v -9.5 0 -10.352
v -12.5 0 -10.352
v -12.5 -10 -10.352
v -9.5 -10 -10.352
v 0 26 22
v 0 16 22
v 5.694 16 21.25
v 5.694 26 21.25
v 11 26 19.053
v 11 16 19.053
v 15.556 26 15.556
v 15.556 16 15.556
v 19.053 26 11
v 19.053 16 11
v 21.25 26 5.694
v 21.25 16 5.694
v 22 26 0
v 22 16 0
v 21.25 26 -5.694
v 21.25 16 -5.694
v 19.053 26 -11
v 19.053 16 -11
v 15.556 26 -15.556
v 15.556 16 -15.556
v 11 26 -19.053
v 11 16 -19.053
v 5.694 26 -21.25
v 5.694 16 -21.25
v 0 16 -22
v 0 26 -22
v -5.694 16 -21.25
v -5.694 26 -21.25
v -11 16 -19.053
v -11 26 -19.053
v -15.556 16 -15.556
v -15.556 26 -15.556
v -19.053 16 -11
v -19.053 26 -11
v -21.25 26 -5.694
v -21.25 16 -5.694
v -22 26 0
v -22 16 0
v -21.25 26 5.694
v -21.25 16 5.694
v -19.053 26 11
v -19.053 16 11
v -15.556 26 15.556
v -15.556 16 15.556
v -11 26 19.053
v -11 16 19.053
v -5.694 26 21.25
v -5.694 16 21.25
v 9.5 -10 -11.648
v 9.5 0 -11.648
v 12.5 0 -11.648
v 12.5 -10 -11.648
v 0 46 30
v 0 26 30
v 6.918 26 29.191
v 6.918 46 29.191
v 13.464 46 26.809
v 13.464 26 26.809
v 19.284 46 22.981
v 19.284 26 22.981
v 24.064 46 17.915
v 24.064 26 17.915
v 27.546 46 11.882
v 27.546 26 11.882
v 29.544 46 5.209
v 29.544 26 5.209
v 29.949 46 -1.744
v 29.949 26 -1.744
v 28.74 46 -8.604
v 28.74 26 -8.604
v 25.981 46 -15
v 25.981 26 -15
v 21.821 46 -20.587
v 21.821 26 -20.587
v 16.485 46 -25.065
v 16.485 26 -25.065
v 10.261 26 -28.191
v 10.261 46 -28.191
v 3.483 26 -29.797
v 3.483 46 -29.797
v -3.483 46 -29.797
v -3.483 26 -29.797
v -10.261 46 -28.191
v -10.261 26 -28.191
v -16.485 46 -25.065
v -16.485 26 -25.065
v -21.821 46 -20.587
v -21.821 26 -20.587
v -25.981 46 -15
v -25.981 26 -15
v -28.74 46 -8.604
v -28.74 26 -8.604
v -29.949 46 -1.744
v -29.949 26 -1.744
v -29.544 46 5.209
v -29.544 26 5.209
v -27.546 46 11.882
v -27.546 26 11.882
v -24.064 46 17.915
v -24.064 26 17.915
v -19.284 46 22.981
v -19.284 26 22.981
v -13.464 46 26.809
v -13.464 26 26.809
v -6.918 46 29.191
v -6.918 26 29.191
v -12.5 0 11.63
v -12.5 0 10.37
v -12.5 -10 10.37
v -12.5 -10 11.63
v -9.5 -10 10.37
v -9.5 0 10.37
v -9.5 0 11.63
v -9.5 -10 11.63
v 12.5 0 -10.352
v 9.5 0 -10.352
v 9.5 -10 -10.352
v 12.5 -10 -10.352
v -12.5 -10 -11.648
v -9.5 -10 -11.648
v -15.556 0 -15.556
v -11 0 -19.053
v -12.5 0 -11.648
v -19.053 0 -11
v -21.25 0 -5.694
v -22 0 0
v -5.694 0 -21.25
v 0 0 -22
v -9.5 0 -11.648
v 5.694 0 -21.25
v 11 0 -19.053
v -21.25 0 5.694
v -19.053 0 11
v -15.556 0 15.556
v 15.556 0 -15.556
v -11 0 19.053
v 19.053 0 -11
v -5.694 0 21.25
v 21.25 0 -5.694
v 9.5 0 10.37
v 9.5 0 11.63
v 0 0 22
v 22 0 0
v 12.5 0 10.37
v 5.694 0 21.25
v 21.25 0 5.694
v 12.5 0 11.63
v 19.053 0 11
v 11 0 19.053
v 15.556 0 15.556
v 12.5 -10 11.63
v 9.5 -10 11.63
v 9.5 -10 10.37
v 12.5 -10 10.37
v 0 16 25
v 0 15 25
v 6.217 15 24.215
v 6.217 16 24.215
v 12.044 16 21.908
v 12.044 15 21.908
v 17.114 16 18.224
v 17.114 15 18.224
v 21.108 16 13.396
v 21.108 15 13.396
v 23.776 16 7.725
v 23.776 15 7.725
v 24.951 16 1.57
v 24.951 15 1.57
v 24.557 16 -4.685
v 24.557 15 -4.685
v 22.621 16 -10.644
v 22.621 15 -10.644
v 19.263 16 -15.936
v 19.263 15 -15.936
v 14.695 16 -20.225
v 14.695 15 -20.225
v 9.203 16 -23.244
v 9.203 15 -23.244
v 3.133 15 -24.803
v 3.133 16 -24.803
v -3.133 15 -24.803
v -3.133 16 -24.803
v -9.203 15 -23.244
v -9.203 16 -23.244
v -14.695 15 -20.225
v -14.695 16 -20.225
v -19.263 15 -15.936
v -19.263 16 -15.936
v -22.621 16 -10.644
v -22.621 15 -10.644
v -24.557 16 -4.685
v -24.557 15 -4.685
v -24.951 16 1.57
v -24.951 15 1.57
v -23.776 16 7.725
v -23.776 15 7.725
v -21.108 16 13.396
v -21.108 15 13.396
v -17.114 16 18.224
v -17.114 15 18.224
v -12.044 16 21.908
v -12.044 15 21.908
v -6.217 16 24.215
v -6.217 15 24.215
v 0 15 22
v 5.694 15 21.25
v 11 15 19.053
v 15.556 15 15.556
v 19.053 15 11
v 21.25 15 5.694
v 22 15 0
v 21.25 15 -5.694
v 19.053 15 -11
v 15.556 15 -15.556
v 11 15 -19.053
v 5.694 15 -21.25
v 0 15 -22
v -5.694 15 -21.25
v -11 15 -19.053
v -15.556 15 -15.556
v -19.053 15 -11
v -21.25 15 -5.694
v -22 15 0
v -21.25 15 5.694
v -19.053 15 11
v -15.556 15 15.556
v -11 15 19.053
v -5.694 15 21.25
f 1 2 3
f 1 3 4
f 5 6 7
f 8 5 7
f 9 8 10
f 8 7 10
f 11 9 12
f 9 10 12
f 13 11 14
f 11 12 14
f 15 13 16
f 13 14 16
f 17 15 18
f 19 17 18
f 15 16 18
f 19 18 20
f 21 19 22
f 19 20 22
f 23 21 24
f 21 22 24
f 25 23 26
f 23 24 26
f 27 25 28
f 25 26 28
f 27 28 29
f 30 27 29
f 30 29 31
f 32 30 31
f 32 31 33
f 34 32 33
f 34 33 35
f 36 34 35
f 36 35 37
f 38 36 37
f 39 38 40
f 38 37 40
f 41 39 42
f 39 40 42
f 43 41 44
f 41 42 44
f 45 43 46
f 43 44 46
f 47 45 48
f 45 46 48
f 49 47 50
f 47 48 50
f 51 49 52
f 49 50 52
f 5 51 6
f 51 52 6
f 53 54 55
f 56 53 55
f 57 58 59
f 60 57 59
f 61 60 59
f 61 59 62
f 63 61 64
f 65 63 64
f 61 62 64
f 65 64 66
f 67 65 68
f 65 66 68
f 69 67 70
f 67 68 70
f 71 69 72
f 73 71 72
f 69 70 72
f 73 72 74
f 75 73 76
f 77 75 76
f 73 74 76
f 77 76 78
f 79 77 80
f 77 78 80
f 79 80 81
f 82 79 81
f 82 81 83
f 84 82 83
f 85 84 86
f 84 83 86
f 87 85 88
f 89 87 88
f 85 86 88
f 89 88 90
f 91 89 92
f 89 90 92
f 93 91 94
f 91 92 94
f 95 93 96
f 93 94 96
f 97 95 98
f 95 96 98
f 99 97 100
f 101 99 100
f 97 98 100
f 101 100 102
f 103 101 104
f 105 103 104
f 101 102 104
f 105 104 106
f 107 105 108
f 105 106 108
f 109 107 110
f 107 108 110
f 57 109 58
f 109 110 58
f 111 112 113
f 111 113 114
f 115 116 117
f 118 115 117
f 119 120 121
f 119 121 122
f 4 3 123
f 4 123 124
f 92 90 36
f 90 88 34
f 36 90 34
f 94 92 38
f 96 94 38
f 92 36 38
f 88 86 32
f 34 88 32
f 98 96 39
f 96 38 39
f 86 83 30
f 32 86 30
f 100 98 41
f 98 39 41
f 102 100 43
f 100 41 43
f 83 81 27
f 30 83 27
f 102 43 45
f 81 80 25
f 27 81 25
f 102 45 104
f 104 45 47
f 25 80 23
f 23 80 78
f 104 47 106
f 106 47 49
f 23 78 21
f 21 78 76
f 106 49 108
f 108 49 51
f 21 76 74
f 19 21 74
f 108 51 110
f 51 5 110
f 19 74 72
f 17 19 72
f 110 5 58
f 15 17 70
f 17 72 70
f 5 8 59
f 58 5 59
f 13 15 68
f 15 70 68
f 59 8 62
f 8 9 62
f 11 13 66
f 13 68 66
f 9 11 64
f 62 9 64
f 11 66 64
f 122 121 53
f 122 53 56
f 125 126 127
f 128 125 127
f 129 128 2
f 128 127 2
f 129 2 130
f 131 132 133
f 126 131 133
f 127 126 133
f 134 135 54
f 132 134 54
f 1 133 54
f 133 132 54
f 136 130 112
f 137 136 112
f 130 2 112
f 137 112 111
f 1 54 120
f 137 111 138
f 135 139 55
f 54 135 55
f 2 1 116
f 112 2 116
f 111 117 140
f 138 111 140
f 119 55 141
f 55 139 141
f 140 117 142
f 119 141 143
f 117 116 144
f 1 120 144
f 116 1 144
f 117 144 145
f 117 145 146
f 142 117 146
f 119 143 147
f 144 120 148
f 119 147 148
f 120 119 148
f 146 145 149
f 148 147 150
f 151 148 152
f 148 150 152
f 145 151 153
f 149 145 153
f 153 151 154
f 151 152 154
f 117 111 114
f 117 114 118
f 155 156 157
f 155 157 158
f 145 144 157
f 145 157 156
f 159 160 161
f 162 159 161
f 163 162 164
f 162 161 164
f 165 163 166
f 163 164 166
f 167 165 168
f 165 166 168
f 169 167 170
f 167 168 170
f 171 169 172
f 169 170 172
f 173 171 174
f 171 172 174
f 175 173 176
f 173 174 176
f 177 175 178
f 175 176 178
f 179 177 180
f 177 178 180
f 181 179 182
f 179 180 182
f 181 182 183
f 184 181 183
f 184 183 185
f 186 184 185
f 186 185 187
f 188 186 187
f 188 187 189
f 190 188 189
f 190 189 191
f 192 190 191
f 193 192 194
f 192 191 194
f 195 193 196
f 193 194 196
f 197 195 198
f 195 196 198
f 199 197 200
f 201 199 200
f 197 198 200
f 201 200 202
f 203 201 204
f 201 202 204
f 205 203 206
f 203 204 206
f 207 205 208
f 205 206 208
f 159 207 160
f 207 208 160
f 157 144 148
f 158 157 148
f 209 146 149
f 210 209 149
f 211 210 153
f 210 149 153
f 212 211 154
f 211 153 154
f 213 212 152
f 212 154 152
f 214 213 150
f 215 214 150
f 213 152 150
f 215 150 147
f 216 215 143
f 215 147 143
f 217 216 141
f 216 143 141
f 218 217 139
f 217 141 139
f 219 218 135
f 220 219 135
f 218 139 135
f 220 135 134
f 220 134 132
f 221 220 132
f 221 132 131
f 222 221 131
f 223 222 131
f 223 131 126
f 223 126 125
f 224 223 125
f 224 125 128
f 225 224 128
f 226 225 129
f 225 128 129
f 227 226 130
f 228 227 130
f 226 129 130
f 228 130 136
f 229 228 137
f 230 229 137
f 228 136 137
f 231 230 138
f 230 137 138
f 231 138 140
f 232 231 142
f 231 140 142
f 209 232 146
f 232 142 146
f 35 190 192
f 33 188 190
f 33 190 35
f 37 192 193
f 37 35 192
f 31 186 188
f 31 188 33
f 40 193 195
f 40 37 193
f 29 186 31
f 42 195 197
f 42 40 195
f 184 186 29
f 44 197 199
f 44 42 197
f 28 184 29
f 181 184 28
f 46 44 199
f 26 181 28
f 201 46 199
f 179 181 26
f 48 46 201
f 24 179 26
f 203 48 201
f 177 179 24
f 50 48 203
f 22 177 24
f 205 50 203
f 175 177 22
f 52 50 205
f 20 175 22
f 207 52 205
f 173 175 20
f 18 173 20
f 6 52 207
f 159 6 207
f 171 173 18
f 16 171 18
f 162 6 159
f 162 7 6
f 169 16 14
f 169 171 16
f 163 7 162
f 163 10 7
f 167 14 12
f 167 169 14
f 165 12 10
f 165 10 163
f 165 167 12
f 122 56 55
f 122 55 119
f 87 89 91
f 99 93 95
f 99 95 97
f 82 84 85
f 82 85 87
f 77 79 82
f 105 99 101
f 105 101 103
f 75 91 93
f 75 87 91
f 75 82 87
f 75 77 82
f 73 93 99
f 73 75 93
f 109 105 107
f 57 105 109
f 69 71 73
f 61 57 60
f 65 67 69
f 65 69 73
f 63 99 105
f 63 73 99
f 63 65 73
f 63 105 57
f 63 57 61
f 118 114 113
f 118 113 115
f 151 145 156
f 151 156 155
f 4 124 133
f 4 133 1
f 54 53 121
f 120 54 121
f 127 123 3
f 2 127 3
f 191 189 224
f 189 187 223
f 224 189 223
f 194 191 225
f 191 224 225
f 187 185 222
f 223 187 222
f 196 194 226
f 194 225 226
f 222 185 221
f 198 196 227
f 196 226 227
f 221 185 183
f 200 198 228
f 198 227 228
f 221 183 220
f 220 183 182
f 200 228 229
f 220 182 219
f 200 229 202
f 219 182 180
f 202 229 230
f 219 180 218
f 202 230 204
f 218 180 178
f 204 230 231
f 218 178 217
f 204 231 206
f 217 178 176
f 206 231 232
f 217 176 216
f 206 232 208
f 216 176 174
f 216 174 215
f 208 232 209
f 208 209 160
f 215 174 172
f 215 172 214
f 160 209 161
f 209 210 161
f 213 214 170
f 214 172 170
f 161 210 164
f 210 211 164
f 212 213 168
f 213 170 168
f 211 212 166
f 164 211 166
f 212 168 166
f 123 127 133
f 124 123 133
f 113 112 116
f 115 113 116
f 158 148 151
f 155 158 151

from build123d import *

# Parameters (mm, degrees)
ESQUISSE1_R        = 22
BOSS_EXTRU_1_DEPTH = 15
ESQUISSE2_R        = 25
BOSS_EXTRU_2_DEPTH = 1
ESQUISSE3_R        = 22
BOSS_EXTRU_3_DEPTH = 10
ESQUISSE4_R        = 30
BOSS_EXTRU_4_DEPTH = 20
ESQUISSE5_W        = 3
ESQUISSE5_H        = 1.260124144
ESQUISSE5_H_2      = 1.295969654
BOSS_EXTRU_5_DEPTH = 10


with BuildPart() as part:
    # Esquisse1 → Boss.-Extru.1 (new body)
    with BuildSketch(Plane(origin=(0, 0, 0), x_dir=(1, 0, 0), z_dir=(0, 1, 0))):
        with Locations(Location((0, 0, 0), (0, 0, 270))):
            Circle(ESQUISSE1_R)
    extrude(amount=BOSS_EXTRU_1_DEPTH)

    # Esquisse2 → Boss.-Extru.2 (add)
    with BuildSketch(Plane(origin=(0, 15, 0), x_dir=(1, 0, 0), z_dir=(0, 1, 0))):
        with Locations(Location((0, 0, 0), (0, 0, 270))):
            Circle(ESQUISSE2_R)
    extrude(amount=BOSS_EXTRU_2_DEPTH)

    # Esquisse3 → Boss.-Extru.3 (add)
    with BuildSketch(Plane(origin=(0, 16, 0), x_dir=(1, 0, 0), z_dir=(0, 1, 0))):
        with Locations(Location((0, 0, 0), (0, 0, 270))):
            Circle(ESQUISSE3_R)
    extrude(amount=BOSS_EXTRU_3_DEPTH)

    # Esquisse4 → Boss.-Extru.4 (add)
    with BuildSketch(Plane(origin=(0, 26, 0), x_dir=(1, 0, 0), z_dir=(0, 1, 0))):
        with Locations(Location((0, 0, 0), (0, 0, 270))):
            Circle(ESQUISSE4_R)
    extrude(amount=BOSS_EXTRU_4_DEPTH)

    # Esquisse5 → Boss.-Extru.5 (add)
    with BuildSketch(Plane.XZ):
        with Locations((-11, 11)):
            Rectangle(ESQUISSE5_W, ESQUISSE5_H)
        with Locations((-11, -11)):
            Rectangle(ESQUISSE5_W, ESQUISSE5_H_2)
        with Locations((11, -11)):
            Rectangle(ESQUISSE5_W, ESQUISSE5_H_2)
        with Locations((11, 11)):
            Rectangle(ESQUISSE5_W, ESQUISSE5_H)
    extrude(amount=BOSS_EXTRU_5_DEPTH)


solid = part.part
